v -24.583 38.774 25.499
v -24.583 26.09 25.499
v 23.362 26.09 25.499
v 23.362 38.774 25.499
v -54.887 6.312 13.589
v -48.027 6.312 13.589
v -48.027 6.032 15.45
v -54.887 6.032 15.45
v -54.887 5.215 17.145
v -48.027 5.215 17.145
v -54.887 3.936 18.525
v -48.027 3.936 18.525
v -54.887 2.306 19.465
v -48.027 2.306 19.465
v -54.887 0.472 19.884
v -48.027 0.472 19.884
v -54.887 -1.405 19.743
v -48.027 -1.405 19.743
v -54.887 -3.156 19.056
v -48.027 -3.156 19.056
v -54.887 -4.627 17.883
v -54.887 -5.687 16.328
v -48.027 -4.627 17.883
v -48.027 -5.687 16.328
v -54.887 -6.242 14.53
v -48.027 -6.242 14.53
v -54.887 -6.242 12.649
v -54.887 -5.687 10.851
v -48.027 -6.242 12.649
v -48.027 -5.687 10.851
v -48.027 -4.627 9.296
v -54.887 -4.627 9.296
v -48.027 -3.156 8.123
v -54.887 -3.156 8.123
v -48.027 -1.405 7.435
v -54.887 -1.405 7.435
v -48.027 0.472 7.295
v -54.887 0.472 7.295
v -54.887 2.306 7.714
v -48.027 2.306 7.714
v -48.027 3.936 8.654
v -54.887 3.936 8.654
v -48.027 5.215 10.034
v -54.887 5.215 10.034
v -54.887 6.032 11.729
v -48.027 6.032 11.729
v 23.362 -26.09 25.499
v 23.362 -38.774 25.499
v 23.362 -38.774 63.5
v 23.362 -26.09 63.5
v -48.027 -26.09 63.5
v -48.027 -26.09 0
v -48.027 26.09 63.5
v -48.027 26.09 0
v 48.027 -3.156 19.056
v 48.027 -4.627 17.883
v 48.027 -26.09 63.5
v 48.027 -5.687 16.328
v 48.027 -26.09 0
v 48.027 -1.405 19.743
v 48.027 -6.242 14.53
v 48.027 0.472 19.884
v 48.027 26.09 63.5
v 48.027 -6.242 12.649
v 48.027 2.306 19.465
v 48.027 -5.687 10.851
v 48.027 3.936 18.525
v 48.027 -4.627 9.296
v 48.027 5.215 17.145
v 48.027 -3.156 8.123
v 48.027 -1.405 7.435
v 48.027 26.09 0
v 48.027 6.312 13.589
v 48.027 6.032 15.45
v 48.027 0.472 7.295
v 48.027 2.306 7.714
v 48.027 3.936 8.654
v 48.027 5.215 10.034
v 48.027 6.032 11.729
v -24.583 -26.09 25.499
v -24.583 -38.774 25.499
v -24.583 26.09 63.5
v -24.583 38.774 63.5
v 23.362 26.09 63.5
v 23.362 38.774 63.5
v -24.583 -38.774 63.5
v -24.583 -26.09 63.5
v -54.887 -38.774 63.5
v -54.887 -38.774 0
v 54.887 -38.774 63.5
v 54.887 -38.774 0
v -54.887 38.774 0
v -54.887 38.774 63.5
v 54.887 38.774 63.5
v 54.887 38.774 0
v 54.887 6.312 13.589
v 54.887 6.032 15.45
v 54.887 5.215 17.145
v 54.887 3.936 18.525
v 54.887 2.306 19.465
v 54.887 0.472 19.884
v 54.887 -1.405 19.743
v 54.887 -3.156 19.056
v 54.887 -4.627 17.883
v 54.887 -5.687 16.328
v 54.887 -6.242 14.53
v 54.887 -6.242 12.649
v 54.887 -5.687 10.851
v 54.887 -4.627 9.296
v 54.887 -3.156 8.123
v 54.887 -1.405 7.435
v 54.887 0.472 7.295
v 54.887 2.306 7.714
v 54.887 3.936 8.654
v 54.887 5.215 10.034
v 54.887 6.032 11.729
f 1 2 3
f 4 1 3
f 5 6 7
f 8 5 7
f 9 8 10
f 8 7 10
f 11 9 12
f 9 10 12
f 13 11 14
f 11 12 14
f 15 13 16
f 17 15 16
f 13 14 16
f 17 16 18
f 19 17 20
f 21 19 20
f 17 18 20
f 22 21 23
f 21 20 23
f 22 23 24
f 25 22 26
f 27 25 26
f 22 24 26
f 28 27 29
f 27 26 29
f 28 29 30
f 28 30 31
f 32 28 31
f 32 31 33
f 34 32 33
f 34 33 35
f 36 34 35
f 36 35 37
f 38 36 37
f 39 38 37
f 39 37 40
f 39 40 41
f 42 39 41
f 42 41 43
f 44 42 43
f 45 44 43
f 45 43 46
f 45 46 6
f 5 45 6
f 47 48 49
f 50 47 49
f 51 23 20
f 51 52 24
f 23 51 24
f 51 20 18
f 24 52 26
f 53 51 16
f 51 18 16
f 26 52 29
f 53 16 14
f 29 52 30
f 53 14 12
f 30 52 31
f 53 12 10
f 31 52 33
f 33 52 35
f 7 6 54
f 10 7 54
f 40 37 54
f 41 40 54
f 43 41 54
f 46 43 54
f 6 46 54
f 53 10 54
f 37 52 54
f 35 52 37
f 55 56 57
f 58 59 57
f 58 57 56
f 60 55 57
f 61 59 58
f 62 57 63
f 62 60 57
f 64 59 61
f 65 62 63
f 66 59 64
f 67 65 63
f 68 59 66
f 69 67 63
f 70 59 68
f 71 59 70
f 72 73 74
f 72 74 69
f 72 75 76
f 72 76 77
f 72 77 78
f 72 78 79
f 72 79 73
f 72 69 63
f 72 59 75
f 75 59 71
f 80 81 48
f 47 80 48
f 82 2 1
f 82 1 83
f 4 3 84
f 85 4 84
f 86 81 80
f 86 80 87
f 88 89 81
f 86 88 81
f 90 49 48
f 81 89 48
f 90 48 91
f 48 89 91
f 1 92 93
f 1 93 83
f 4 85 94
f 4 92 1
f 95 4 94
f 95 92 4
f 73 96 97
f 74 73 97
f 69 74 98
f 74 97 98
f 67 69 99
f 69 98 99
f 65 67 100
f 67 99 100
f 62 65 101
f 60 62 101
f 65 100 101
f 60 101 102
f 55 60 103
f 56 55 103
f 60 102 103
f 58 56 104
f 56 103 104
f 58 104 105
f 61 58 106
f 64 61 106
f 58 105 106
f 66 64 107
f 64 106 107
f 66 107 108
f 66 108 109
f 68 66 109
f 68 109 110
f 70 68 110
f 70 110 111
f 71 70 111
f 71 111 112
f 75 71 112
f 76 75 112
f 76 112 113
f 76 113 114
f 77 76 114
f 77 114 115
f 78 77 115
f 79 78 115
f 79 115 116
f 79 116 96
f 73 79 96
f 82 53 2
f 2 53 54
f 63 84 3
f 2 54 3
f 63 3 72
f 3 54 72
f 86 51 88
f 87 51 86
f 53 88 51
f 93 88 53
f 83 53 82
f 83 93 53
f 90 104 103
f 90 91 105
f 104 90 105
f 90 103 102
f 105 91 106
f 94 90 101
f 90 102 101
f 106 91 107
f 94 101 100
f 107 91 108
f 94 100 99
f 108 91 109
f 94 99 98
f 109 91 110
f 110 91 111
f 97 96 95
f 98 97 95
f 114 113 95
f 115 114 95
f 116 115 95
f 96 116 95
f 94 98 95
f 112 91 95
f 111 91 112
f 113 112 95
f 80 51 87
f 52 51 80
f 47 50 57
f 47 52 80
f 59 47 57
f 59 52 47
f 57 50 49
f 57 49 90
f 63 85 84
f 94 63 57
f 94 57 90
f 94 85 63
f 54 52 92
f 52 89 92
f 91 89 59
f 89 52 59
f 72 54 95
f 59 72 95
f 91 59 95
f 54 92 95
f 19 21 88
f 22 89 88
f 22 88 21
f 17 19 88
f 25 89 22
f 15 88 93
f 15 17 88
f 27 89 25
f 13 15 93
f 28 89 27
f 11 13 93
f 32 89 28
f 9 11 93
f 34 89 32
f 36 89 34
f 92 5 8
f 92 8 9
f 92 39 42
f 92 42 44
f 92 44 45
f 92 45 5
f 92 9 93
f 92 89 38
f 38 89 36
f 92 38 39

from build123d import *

# Parameters (mm, degrees)
F0_W     = 109.774076
F0_H     = 77.548884
F1_DEPTH = 63.5
F2_W     = 96.05325
F2_H     = 52.179004
F3_DEPTH = 63.5
F4_W     = 81.802986
F4_H     = 63.615836
F5_DEPTH = 63.5
F6_W     = 47.944924
F6_H     = 38.00063
F7_DEPTH = 101.6
F8_R     = 6.312248
F9_DEPTH = 254


with BuildPart() as f1:
    # F0 (on Top) → F1 (new body)
    with BuildSketch(Plane.XY):
        Rectangle(F0_W, F0_H)
    extrude(amount=F1_DEPTH)

    # F2 (on Top) → F3 (cut)
    with BuildSketch(Plane.XY):
        Rectangle(F2_W, F2_H)
    extrude(amount=F3_DEPTH, mode=Mode.SUBTRACT)

    # F4 (on Top) → F5 (cut)
    with BuildSketch(Plane.XY):
        Rectangle(F4_W, F4_H)
    extrude(amount=-F5_DEPTH, mode=Mode.SUBTRACT)

    # F6 (on face) → F7 (cut)
    with BuildSketch(Plane.XZ.offset(38.774442)):
        with Locations((-0.610764, 44.499685)):
            Rectangle(F6_W, F6_H)
    extrude(amount=-F7_DEPTH, mode=Mode.SUBTRACT)

    # F8 (on face) → F9 (cut)
    with BuildSketch(Plane.YZ.offset(54.887038)):
        with Locations((0, 13.589485)):
            Circle(F8_R)
    extrude(amount=-F9_DEPTH, mode=Mode.SUBTRACT)


solid = f1.part
